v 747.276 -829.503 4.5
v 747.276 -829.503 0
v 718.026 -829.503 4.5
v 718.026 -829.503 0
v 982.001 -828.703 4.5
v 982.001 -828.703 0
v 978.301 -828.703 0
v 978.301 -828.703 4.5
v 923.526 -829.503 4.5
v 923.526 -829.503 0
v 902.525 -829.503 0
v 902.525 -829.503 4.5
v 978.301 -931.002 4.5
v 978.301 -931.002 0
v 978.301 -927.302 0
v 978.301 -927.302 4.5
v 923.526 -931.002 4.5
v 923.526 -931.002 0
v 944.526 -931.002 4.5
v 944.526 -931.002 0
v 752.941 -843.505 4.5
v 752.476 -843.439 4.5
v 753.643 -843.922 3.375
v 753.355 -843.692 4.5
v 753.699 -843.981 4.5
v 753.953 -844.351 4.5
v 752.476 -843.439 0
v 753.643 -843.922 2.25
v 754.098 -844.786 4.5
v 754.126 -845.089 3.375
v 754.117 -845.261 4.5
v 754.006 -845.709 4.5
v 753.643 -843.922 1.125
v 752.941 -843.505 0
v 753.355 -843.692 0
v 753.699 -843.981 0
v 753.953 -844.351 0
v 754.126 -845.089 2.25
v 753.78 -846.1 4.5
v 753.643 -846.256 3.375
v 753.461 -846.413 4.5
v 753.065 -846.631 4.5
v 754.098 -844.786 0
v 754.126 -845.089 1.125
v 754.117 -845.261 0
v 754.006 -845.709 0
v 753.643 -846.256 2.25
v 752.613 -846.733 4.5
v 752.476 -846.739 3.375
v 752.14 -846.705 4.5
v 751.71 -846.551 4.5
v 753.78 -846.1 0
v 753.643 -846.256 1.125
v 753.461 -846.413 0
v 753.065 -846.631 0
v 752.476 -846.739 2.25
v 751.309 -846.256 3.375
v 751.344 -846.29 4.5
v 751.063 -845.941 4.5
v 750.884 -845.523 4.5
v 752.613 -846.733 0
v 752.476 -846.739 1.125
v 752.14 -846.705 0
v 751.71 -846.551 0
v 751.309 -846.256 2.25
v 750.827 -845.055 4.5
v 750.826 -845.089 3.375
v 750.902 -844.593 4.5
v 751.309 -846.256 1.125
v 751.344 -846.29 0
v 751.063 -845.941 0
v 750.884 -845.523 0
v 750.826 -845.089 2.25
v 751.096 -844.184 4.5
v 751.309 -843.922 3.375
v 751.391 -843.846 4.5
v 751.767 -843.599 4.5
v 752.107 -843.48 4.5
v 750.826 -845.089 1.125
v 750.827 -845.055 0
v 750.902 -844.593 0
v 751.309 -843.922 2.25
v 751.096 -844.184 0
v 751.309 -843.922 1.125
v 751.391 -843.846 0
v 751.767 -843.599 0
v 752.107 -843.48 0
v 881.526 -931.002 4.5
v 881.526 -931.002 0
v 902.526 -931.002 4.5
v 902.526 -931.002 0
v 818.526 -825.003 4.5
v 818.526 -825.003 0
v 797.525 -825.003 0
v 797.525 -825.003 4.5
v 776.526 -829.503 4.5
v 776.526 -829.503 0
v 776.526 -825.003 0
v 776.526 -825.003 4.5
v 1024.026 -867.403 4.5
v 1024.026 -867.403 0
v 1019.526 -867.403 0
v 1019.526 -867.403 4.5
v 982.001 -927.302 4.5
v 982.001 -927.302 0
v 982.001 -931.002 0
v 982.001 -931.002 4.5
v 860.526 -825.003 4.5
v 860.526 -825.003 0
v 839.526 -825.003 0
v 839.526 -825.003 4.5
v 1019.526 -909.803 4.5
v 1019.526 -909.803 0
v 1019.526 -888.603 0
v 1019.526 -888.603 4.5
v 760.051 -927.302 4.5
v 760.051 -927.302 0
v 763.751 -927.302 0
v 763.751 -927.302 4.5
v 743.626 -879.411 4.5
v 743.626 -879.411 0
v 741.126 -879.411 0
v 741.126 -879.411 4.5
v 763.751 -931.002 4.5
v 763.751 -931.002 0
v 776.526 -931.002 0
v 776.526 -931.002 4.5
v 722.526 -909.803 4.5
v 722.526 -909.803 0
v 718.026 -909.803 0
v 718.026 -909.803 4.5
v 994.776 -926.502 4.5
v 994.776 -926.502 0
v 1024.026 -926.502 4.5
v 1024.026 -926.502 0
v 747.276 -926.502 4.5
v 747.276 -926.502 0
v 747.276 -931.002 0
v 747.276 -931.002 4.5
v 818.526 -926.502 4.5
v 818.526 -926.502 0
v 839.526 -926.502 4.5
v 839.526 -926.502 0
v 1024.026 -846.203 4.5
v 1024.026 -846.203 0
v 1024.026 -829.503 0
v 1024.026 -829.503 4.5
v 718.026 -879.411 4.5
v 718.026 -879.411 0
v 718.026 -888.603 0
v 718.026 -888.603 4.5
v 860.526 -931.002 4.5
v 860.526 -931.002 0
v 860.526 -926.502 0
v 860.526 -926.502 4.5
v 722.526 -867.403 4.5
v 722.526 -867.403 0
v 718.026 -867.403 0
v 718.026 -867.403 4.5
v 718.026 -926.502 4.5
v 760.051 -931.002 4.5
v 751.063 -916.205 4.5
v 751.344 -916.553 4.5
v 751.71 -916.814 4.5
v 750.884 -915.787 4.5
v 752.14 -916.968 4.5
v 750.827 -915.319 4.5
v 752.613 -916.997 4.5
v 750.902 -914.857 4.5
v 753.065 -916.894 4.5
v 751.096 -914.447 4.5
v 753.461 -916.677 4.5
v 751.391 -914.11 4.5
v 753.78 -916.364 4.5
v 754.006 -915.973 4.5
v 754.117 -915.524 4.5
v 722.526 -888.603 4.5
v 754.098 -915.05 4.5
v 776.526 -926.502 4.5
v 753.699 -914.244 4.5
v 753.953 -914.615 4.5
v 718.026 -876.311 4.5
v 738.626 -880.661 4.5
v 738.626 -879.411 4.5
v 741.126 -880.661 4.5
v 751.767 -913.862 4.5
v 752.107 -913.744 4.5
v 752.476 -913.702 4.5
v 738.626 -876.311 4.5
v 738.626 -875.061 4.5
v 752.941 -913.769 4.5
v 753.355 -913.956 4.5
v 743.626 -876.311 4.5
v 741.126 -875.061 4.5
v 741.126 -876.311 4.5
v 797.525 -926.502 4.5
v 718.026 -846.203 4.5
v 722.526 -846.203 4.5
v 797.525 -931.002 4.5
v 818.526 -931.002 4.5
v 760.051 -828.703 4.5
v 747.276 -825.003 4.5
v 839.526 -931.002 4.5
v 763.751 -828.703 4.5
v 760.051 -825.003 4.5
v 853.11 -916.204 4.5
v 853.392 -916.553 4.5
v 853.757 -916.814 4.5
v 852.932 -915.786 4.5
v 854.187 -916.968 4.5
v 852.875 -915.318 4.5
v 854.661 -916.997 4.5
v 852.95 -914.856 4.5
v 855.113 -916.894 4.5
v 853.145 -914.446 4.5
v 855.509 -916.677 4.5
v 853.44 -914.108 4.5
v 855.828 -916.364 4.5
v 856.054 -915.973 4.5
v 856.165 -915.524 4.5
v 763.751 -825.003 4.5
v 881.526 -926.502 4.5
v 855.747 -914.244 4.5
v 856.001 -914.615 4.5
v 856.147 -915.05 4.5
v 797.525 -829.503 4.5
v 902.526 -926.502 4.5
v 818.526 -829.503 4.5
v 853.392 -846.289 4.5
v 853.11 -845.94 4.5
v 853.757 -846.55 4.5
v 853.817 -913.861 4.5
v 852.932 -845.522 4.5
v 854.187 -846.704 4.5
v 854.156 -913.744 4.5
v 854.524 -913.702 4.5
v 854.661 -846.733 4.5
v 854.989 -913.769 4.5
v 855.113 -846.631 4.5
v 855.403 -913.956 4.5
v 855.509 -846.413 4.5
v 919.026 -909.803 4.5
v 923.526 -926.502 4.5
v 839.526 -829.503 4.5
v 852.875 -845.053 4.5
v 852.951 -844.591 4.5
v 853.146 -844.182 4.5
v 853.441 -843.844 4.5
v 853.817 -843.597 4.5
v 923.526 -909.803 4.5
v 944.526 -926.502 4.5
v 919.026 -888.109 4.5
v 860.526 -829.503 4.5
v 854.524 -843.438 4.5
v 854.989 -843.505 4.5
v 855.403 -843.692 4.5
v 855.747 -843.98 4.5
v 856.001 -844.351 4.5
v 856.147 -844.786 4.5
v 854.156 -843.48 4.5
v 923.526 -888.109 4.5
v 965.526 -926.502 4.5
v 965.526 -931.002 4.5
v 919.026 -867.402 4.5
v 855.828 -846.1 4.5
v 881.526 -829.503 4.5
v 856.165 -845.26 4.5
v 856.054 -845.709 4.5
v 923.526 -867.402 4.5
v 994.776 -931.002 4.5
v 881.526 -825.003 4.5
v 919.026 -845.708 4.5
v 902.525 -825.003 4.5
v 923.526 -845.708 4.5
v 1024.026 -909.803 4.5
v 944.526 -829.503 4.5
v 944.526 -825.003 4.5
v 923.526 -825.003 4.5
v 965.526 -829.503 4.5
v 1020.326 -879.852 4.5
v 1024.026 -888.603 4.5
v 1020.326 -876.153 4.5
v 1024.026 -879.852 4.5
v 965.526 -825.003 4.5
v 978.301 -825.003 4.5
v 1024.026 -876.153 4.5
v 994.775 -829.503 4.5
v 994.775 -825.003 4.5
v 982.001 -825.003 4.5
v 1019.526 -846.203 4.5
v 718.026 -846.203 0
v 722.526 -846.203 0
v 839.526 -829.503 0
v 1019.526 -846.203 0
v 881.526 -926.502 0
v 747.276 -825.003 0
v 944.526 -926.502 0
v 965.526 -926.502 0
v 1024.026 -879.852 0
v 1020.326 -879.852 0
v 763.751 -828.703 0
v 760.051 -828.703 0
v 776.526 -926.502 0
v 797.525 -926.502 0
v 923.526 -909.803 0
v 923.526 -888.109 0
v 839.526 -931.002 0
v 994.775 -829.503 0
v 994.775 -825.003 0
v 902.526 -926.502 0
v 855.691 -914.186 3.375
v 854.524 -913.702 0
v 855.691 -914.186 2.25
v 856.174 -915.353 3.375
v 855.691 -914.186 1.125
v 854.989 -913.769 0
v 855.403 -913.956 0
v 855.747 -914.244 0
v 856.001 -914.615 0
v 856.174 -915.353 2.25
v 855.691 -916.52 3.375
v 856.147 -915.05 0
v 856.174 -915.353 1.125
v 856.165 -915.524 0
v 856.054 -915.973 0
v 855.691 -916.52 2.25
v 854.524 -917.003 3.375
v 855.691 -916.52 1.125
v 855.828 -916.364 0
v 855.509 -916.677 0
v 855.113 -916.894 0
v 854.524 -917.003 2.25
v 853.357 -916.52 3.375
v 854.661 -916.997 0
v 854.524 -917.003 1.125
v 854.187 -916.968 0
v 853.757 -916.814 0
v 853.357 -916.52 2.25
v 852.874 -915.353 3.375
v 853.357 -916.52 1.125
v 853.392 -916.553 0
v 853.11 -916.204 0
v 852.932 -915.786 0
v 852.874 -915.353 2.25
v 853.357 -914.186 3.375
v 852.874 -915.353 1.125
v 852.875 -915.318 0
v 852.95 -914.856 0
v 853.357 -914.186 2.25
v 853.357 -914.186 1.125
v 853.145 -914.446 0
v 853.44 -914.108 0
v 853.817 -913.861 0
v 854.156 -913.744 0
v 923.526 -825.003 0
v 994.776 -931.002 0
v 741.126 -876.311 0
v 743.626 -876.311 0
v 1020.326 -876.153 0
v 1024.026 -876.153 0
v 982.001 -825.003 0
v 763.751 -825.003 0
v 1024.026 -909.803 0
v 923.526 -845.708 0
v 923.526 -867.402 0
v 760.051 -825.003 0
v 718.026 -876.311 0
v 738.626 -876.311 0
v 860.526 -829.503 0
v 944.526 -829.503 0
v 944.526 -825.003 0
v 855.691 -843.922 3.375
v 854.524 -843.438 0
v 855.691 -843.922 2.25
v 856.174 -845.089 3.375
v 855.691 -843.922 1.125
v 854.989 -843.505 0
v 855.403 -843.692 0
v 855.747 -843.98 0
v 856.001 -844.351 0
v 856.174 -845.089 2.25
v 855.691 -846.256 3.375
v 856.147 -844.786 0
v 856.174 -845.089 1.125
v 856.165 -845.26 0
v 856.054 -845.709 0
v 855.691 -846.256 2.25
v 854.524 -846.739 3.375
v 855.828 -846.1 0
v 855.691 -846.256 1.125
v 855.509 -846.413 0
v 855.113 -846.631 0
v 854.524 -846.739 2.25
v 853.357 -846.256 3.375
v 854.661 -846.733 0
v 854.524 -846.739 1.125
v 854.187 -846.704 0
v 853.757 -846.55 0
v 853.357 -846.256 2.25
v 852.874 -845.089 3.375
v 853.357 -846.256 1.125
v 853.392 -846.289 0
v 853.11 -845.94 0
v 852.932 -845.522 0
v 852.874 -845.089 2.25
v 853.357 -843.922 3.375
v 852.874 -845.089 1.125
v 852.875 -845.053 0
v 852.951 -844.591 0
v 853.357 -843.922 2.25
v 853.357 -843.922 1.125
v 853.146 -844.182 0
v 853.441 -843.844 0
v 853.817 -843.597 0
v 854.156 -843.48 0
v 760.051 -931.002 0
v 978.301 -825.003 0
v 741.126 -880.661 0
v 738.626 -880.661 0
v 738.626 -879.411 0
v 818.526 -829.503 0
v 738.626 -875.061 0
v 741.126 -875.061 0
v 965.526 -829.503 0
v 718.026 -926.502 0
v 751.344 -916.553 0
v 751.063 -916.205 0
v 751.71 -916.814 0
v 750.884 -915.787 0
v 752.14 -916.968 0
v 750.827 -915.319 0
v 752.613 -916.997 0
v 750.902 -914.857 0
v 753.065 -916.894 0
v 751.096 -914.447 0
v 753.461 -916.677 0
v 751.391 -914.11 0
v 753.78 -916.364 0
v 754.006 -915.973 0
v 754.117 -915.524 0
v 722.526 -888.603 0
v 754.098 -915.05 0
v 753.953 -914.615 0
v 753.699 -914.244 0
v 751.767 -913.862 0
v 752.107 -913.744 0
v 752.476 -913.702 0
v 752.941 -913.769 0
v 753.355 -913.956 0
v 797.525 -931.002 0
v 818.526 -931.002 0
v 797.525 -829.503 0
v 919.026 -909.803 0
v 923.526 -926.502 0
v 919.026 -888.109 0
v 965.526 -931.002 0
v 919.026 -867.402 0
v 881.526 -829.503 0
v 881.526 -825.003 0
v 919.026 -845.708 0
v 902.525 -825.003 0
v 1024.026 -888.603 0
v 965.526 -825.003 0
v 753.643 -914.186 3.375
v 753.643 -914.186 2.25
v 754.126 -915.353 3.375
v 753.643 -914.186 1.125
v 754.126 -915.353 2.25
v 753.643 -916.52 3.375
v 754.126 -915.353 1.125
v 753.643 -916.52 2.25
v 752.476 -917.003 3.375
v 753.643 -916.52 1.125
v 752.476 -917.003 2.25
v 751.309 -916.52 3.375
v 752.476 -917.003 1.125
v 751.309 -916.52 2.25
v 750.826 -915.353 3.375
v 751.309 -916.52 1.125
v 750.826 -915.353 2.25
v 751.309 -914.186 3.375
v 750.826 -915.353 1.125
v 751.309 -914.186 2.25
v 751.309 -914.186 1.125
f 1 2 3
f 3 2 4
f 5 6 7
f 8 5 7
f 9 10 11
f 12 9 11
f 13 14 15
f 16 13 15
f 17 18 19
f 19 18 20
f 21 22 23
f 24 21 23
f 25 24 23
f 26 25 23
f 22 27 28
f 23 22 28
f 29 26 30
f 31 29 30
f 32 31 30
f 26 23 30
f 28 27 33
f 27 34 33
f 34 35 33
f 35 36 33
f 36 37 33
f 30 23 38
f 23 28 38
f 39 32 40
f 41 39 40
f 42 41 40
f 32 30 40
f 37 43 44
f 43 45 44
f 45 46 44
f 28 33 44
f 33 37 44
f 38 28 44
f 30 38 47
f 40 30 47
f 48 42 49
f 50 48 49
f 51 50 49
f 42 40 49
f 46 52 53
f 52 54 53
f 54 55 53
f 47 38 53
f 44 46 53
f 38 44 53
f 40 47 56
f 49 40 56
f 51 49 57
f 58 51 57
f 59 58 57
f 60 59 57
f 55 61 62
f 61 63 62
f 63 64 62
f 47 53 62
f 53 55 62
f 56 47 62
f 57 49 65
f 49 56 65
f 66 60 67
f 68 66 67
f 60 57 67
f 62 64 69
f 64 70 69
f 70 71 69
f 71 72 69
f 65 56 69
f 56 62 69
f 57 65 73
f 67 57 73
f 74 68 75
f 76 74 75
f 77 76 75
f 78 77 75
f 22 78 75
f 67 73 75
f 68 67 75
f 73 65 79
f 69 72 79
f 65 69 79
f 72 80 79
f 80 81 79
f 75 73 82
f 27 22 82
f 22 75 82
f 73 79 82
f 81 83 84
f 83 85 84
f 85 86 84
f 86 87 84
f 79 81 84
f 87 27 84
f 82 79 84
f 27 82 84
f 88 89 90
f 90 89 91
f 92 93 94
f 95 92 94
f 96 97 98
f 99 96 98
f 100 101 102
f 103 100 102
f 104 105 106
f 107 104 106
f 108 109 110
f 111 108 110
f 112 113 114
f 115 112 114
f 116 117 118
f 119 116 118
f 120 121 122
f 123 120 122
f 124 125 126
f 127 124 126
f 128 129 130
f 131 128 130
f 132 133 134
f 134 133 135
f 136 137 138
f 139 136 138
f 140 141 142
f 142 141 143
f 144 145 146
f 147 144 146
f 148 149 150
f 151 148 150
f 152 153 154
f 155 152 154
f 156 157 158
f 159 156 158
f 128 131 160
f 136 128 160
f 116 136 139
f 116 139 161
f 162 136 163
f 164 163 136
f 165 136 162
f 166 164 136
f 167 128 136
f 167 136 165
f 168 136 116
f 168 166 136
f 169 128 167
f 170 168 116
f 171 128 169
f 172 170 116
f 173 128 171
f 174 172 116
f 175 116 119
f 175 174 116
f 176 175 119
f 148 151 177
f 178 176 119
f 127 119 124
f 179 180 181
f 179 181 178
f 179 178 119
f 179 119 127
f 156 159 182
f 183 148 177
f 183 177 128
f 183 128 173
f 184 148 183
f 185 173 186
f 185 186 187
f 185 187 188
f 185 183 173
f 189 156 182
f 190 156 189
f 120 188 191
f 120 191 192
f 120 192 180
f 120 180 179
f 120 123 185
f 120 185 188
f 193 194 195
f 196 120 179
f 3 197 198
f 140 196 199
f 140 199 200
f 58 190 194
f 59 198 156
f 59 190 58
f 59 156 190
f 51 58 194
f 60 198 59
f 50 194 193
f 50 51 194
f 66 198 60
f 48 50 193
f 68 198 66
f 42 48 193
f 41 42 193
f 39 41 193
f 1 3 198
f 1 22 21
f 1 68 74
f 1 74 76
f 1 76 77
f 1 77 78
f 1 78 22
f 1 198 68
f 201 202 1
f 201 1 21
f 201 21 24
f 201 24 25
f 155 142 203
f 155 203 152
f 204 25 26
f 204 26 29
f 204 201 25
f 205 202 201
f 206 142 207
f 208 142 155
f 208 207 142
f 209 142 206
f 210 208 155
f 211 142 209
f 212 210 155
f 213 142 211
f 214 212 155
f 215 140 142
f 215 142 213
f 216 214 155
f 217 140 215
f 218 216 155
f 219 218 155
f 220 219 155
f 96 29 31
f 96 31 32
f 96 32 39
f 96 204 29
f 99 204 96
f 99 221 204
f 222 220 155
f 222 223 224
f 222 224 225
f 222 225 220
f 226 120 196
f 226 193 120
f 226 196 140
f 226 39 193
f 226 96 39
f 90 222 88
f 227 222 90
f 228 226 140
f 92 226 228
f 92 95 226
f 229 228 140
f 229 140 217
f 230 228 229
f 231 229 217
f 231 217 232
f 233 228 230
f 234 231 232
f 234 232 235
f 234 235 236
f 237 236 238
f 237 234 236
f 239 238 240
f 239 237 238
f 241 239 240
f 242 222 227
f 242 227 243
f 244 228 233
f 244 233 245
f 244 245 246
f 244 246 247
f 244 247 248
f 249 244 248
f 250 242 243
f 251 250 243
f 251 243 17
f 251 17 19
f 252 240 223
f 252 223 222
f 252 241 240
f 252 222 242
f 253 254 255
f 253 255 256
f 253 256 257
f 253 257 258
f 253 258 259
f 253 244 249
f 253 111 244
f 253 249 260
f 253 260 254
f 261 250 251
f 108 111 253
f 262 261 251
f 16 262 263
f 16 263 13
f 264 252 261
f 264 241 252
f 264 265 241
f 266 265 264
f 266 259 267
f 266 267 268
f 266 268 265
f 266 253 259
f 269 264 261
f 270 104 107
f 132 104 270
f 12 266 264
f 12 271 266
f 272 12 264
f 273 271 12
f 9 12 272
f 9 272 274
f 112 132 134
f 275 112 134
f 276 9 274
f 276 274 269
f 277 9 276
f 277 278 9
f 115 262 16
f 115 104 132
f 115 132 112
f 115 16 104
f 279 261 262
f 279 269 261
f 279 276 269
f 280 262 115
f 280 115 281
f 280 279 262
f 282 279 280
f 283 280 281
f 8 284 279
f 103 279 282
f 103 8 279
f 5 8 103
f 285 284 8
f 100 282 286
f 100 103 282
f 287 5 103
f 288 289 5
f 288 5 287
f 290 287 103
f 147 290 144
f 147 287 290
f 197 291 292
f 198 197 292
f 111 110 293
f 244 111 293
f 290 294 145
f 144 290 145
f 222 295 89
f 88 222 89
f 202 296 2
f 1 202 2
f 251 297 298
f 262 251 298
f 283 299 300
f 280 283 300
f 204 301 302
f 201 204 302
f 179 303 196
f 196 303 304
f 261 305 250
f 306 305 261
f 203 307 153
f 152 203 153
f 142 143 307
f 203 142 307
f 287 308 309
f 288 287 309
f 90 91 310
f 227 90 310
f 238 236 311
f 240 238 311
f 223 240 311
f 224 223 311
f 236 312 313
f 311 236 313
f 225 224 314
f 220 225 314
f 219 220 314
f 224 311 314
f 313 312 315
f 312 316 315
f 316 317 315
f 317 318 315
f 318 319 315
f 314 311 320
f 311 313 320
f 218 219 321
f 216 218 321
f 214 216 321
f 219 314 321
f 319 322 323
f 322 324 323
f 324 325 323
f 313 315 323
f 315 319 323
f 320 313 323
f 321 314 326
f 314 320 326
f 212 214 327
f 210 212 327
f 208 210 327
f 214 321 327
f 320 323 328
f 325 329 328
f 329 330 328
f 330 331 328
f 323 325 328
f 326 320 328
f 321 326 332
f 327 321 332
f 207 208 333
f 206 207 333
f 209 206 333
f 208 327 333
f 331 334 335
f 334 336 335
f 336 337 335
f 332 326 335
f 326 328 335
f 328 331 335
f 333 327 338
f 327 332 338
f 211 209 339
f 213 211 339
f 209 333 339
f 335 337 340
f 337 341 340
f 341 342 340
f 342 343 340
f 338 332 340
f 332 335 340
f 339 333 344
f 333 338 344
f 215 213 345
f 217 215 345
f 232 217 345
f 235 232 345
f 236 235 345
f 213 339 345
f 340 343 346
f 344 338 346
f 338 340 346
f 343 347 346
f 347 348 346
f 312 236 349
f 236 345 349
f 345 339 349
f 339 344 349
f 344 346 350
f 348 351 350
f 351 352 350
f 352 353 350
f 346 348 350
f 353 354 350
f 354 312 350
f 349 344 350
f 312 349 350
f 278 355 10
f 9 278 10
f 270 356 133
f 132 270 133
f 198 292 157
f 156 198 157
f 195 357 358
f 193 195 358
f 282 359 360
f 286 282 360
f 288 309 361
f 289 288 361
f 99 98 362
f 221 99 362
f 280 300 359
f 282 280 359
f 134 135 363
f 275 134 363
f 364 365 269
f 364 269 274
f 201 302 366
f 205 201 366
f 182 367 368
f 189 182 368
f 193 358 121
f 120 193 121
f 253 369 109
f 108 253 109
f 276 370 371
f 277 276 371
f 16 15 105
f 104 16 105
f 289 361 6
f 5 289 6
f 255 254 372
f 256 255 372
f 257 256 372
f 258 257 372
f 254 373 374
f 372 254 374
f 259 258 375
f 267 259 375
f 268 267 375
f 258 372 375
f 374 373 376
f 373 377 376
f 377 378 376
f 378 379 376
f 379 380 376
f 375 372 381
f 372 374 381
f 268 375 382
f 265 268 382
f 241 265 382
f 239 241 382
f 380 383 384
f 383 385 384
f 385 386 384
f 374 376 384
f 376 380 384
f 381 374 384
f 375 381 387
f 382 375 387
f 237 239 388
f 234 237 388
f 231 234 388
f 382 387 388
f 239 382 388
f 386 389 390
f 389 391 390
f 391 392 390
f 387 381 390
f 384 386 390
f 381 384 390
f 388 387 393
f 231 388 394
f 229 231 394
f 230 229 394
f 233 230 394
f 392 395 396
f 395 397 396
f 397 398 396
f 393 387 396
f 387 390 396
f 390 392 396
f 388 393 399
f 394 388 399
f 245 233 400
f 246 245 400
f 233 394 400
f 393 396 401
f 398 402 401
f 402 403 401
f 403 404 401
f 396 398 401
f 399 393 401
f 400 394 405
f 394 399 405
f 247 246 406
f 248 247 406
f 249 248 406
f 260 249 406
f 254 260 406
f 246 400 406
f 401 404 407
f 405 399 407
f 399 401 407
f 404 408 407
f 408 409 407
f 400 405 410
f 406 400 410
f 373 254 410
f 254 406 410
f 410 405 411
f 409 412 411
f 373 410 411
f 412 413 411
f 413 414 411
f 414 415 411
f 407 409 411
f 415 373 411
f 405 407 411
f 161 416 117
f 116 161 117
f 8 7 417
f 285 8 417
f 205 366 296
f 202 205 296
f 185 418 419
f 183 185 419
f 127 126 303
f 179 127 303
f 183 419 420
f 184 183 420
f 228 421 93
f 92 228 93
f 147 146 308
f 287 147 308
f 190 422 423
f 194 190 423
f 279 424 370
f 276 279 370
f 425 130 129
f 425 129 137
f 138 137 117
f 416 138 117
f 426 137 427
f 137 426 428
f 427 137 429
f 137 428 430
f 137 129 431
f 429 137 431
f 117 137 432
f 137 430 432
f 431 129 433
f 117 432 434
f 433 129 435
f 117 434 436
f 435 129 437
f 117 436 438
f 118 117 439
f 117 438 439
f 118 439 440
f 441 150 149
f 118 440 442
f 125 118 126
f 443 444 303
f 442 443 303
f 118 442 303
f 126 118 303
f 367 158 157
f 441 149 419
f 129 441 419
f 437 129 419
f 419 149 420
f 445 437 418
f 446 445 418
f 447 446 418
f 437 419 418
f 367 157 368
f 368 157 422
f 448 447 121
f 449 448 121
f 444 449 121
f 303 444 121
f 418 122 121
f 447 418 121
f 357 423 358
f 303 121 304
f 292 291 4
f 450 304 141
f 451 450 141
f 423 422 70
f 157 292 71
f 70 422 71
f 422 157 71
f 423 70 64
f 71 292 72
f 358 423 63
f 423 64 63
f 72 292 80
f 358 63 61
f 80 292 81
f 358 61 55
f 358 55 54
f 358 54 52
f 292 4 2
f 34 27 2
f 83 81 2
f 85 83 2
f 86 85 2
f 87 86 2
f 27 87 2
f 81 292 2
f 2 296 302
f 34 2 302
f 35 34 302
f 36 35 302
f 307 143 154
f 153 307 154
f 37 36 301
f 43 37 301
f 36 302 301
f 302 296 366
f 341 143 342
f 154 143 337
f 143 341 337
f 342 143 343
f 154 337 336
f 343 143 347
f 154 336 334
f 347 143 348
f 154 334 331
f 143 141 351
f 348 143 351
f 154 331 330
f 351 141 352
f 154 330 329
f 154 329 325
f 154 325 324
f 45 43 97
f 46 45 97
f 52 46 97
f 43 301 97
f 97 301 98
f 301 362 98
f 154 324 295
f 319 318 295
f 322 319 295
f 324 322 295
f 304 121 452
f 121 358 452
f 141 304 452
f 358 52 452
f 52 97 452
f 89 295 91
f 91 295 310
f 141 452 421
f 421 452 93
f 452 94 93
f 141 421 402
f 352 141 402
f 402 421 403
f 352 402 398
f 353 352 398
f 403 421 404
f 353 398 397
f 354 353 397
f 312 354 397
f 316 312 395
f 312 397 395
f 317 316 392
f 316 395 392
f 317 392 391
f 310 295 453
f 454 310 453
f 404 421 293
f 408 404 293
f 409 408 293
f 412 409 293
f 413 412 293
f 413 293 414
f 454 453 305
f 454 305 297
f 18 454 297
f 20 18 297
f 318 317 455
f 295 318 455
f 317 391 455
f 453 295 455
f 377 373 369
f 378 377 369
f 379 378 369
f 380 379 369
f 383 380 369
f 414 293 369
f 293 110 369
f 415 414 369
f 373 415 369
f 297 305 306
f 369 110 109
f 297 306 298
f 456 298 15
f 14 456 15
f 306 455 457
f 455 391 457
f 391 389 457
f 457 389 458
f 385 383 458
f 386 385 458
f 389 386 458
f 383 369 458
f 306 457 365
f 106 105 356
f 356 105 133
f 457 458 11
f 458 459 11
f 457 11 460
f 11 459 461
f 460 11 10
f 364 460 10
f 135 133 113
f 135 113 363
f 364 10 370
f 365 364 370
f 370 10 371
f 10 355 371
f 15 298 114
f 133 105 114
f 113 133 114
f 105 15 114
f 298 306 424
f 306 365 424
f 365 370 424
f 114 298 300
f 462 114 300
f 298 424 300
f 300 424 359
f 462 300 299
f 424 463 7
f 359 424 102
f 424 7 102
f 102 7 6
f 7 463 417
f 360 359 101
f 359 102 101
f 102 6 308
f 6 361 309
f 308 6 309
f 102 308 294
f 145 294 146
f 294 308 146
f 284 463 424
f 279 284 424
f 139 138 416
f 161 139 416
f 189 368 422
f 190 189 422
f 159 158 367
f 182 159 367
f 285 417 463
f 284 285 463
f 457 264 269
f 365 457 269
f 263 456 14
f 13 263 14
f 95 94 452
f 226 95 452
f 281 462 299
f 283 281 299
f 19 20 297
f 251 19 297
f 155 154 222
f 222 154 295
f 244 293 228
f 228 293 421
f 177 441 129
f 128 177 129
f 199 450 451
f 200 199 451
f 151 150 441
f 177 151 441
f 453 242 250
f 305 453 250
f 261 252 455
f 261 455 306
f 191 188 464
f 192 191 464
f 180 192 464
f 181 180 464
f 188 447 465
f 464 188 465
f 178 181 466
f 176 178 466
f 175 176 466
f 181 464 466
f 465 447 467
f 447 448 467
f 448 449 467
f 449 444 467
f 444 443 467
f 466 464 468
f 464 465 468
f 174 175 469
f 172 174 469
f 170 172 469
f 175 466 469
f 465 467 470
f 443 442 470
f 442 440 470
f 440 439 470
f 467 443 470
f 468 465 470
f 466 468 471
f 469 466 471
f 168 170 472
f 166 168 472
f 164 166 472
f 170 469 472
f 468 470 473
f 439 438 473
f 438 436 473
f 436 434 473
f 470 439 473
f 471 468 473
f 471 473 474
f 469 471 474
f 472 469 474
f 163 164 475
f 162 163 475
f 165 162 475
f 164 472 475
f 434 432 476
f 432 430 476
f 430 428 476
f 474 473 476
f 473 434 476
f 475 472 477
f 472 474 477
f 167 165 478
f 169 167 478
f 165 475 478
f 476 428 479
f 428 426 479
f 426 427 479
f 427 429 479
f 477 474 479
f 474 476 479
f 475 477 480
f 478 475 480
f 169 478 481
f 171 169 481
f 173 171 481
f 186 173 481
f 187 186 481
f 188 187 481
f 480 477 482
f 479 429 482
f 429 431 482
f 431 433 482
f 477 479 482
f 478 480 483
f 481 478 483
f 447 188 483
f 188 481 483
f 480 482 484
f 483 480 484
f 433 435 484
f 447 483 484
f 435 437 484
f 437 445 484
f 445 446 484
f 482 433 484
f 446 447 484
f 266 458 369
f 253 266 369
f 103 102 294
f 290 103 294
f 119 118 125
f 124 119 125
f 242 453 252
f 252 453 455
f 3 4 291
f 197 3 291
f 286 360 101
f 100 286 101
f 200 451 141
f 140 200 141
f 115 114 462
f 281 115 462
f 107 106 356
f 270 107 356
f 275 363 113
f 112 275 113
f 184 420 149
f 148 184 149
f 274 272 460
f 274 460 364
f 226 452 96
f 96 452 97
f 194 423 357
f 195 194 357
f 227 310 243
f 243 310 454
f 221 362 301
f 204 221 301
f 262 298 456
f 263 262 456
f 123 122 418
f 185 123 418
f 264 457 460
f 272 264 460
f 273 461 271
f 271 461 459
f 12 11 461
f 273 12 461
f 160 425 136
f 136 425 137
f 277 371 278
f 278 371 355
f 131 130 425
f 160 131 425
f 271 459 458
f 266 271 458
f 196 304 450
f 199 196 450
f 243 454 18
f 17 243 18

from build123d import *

# Parameters (mm, degrees)
MODEL_W             = 4.499998054
MODEL_H             = 21.693928328
MODEL_H_2           = 21.693787217
BOSS_EXTRUDE1_DEPTH = 4.5


with BuildPart() as part:
    # Model → Boss-Extrude1 (new body)
    with BuildSketch(Plane.XY):
        Polygon((760.050761477, -825.00268896), (747.275655091, -825.00268896), (747.275655091, -829.502687015), (722.525753986, -829.502687015), (718.025755932, -829.502687015), (718.025755932, -846.202798955), (722.525753986, -846.202798955), (722.525753986, -867.402520894), (718.025755932, -867.402520894), (718.025755932, -876.311006448), (738.62589676, -876.311006448), (738.62589676, -875.061150059), (741.125997592, -875.061150059), (741.125997592, -876.311006448), (743.625922036, -876.311006448), (743.625922036, -879.410935336), (741.125997592, -879.410935336), (741.125997592, -880.660791724), (738.62589676, -880.660791724), (738.62589676, -879.410935336), (718.025755932, -879.410935336), (718.025755932, -888.602772), (722.525753986, -888.602772), (722.525753986, -909.802529217), (718.025755932, -909.802529217), (718.025755932, -926.502288379), (747.275655091, -926.502288379), (747.275655091, -931.002251156), (760.050761477, -931.002251156), (760.050761477, -927.30221199), (763.750800642, -927.30221199), (763.750800642, -931.002251156), (776.52555425, -931.002251156), (776.52555425, -926.502288379), (797.525462856, -926.502288379), (797.525462856, -931.002251156), (818.525759518, -931.002251156), (818.525759518, -926.502288379), (839.525668123, -926.502288379), (839.525668123, -931.002251156), (860.525612007, -931.002251156), (860.525612007, -926.502288379), (881.525873391, -926.502288379), (881.525873391, -931.002251156), (902.525781997, -931.002251156), (902.525781997, -926.502288379), (923.52572588, -926.502288379), (923.52572588, -931.002251156), (944.525634486, -931.002251156), (944.525634486, -926.502288379), (965.52557837, -926.502288379), (965.52557837, -931.002251156), (978.300649478, -931.002251156), (978.300649478, -927.30221199), (982.000688643, -927.30221199), (982.000688643, -931.002251156), (994.775795029, -931.002251156), (994.775795029, -926.502288379), (1024.025694188, -926.502288379), (1024.025694188, -909.802529217), (1019.525696134, -909.802529217), (1019.525696134, -888.602772), (1024.025694188, -888.602772), (1024.025694188, -879.852225058), (1020.325655023, -879.852225058), (1020.325655023, -876.152715059), (1024.025694188, -876.152715059), (1024.025694188, -867.402520894), (1019.525696134, -867.402520894), (1019.525696134, -846.202798955), (1024.025694188, -846.202798955), (1024.025694188, -829.502687015), (1019.525696134, -829.502687015), (994.775442251, -829.502687015), (994.775442251, -825.00268896), (982.000688643, -825.00268896), (982.000688643, -828.702728126), (978.300649478, -828.702728126), (978.300649478, -825.00268896), (965.52557837, -825.00268896), (965.52557837, -829.502687015), (944.525634486, -829.502687015), (944.525634486, -825.00268896), (923.52572588, -825.00268896), (923.52572588, -829.502687015), (902.525429219, -829.502687015), (902.525429219, -825.00268896), (881.525520613, -825.00268896), (881.525520613, -829.502687015), (860.525612007, -829.502687015), (860.525612007, -825.00268896), (839.525668123, -825.00268896), (839.525668123, -829.502687015), (818.525759518, -829.502687015), (818.525759518, -825.00268896), (797.525462856, -825.00268896), (797.525462856, -829.502687015), (776.52555425, -829.502687015), (776.52555425, -825.00268896), (763.750800642, -825.00268896), (763.750800642, -828.702728126), (760.050761477, -828.702728126), align=None)
        with Locations((921.275726853, -856.555380341)):
            Rectangle(MODEL_W, MODEL_H, mode=Mode.SUBTRACT)
        with Locations((921.275726853, -898.955635608)):
            Rectangle(MODEL_W, MODEL_H_2, mode=Mode.SUBTRACT)
        with BuildLine():
            add(Edge.make_bspline(
                [(752.476022867, -917.002758937), (751.564797868, -917.002758937), (750.826187035, -916.264148104), (750.826187035, -915.352570327), (750.826187035, -914.441698105), (751.564797868, -913.702381716), (752.476022867, -913.702381716)],
                knots=[2, 2, 2, 2, 3, 3, 3, 4, 4, 4, 4], degree=3))
            add(Edge.make_bspline(
                [(752.476022867, -913.702381716), (753.387247867, -913.702381716), (754.126246756, -914.441698105), (754.126246756, -915.352570327), (754.126246756, -916.264148104), (753.387247867, -917.002758937), (752.476022867, -917.002758937)],
                knots=[0, 0, 0, 0, 1, 1, 1, 2, 2, 2, 2], degree=3))
        make_face(mode=Mode.SUBTRACT)
        with BuildLine():
            add(Edge.make_bspline(
                [(752.476022867, -846.739021177), (751.564797868, -846.739021177), (750.826187035, -846.000375066), (750.826187035, -845.088797289), (750.826187035, -844.177925067), (751.564797868, -843.438608678), (752.476022867, -843.438608678)],
                knots=[2, 2, 2, 2, 3, 3, 3, 4, 4, 4, 4], degree=3))
            add(Edge.make_bspline(
                [(752.476022867, -843.438608678), (753.387247867, -843.438608678), (754.126246756, -844.177925067), (754.126246756, -845.088797289), (754.126246756, -846.000375066), (753.387247867, -846.739021177), (752.476022867, -846.739021177)],
                knots=[0, 0, 0, 0, 1, 1, 1, 2, 2, 2, 2], degree=3))
        make_face(mode=Mode.SUBTRACT)
        with BuildLine():
            add(Edge.make_bspline(
                [(854.523909509, -917.002758937), (853.61282562, -917.002758937), (852.874214787, -916.264148104), (852.874214787, -915.352570327), (852.874214787, -914.441698105), (853.61282562, -913.702381716), (854.523909509, -913.702381716)],
                knots=[2, 2, 2, 2, 3, 3, 3, 4, 4, 4, 4], degree=3))
            add(Edge.make_bspline(
                [(854.523909509, -913.702381716), (855.435452008, -913.702381716), (856.174274508, -914.441698105), (856.174274508, -915.352570327), (856.174274508, -916.264148104), (855.435452008, -917.002758937), (854.523909509, -917.002758937)],
                knots=[0, 0, 0, 0, 1, 1, 1, 2, 2, 2, 2], degree=3))
        make_face(mode=Mode.SUBTRACT)
        with BuildLine():
            add(Edge.make_bspline(
                [(854.523909509, -846.738844788), (853.61282562, -846.738844788), (852.874214787, -846.000198677), (852.874214787, -845.088656178), (852.874214787, -844.177748678), (853.61282562, -843.438432289), (854.523909509, -843.438432289)],
                knots=[2, 2, 2, 2, 3, 3, 3, 4, 4, 4, 4], degree=3))
            add(Edge.make_bspline(
                [(854.523909509, -843.438432289), (855.435452008, -843.438432289), (856.174274508, -844.177748678), (856.174274508, -845.088656178), (856.174274508, -846.000198677), (855.435452008, -846.738844788), (854.523909509, -846.738844788)],
                knots=[0, 0, 0, 0, 1, 1, 1, 2, 2, 2, 2], degree=3))
        make_face(mode=Mode.SUBTRACT)
    extrude(amount=BOSS_EXTRUDE1_DEPTH)


solid = part.part
